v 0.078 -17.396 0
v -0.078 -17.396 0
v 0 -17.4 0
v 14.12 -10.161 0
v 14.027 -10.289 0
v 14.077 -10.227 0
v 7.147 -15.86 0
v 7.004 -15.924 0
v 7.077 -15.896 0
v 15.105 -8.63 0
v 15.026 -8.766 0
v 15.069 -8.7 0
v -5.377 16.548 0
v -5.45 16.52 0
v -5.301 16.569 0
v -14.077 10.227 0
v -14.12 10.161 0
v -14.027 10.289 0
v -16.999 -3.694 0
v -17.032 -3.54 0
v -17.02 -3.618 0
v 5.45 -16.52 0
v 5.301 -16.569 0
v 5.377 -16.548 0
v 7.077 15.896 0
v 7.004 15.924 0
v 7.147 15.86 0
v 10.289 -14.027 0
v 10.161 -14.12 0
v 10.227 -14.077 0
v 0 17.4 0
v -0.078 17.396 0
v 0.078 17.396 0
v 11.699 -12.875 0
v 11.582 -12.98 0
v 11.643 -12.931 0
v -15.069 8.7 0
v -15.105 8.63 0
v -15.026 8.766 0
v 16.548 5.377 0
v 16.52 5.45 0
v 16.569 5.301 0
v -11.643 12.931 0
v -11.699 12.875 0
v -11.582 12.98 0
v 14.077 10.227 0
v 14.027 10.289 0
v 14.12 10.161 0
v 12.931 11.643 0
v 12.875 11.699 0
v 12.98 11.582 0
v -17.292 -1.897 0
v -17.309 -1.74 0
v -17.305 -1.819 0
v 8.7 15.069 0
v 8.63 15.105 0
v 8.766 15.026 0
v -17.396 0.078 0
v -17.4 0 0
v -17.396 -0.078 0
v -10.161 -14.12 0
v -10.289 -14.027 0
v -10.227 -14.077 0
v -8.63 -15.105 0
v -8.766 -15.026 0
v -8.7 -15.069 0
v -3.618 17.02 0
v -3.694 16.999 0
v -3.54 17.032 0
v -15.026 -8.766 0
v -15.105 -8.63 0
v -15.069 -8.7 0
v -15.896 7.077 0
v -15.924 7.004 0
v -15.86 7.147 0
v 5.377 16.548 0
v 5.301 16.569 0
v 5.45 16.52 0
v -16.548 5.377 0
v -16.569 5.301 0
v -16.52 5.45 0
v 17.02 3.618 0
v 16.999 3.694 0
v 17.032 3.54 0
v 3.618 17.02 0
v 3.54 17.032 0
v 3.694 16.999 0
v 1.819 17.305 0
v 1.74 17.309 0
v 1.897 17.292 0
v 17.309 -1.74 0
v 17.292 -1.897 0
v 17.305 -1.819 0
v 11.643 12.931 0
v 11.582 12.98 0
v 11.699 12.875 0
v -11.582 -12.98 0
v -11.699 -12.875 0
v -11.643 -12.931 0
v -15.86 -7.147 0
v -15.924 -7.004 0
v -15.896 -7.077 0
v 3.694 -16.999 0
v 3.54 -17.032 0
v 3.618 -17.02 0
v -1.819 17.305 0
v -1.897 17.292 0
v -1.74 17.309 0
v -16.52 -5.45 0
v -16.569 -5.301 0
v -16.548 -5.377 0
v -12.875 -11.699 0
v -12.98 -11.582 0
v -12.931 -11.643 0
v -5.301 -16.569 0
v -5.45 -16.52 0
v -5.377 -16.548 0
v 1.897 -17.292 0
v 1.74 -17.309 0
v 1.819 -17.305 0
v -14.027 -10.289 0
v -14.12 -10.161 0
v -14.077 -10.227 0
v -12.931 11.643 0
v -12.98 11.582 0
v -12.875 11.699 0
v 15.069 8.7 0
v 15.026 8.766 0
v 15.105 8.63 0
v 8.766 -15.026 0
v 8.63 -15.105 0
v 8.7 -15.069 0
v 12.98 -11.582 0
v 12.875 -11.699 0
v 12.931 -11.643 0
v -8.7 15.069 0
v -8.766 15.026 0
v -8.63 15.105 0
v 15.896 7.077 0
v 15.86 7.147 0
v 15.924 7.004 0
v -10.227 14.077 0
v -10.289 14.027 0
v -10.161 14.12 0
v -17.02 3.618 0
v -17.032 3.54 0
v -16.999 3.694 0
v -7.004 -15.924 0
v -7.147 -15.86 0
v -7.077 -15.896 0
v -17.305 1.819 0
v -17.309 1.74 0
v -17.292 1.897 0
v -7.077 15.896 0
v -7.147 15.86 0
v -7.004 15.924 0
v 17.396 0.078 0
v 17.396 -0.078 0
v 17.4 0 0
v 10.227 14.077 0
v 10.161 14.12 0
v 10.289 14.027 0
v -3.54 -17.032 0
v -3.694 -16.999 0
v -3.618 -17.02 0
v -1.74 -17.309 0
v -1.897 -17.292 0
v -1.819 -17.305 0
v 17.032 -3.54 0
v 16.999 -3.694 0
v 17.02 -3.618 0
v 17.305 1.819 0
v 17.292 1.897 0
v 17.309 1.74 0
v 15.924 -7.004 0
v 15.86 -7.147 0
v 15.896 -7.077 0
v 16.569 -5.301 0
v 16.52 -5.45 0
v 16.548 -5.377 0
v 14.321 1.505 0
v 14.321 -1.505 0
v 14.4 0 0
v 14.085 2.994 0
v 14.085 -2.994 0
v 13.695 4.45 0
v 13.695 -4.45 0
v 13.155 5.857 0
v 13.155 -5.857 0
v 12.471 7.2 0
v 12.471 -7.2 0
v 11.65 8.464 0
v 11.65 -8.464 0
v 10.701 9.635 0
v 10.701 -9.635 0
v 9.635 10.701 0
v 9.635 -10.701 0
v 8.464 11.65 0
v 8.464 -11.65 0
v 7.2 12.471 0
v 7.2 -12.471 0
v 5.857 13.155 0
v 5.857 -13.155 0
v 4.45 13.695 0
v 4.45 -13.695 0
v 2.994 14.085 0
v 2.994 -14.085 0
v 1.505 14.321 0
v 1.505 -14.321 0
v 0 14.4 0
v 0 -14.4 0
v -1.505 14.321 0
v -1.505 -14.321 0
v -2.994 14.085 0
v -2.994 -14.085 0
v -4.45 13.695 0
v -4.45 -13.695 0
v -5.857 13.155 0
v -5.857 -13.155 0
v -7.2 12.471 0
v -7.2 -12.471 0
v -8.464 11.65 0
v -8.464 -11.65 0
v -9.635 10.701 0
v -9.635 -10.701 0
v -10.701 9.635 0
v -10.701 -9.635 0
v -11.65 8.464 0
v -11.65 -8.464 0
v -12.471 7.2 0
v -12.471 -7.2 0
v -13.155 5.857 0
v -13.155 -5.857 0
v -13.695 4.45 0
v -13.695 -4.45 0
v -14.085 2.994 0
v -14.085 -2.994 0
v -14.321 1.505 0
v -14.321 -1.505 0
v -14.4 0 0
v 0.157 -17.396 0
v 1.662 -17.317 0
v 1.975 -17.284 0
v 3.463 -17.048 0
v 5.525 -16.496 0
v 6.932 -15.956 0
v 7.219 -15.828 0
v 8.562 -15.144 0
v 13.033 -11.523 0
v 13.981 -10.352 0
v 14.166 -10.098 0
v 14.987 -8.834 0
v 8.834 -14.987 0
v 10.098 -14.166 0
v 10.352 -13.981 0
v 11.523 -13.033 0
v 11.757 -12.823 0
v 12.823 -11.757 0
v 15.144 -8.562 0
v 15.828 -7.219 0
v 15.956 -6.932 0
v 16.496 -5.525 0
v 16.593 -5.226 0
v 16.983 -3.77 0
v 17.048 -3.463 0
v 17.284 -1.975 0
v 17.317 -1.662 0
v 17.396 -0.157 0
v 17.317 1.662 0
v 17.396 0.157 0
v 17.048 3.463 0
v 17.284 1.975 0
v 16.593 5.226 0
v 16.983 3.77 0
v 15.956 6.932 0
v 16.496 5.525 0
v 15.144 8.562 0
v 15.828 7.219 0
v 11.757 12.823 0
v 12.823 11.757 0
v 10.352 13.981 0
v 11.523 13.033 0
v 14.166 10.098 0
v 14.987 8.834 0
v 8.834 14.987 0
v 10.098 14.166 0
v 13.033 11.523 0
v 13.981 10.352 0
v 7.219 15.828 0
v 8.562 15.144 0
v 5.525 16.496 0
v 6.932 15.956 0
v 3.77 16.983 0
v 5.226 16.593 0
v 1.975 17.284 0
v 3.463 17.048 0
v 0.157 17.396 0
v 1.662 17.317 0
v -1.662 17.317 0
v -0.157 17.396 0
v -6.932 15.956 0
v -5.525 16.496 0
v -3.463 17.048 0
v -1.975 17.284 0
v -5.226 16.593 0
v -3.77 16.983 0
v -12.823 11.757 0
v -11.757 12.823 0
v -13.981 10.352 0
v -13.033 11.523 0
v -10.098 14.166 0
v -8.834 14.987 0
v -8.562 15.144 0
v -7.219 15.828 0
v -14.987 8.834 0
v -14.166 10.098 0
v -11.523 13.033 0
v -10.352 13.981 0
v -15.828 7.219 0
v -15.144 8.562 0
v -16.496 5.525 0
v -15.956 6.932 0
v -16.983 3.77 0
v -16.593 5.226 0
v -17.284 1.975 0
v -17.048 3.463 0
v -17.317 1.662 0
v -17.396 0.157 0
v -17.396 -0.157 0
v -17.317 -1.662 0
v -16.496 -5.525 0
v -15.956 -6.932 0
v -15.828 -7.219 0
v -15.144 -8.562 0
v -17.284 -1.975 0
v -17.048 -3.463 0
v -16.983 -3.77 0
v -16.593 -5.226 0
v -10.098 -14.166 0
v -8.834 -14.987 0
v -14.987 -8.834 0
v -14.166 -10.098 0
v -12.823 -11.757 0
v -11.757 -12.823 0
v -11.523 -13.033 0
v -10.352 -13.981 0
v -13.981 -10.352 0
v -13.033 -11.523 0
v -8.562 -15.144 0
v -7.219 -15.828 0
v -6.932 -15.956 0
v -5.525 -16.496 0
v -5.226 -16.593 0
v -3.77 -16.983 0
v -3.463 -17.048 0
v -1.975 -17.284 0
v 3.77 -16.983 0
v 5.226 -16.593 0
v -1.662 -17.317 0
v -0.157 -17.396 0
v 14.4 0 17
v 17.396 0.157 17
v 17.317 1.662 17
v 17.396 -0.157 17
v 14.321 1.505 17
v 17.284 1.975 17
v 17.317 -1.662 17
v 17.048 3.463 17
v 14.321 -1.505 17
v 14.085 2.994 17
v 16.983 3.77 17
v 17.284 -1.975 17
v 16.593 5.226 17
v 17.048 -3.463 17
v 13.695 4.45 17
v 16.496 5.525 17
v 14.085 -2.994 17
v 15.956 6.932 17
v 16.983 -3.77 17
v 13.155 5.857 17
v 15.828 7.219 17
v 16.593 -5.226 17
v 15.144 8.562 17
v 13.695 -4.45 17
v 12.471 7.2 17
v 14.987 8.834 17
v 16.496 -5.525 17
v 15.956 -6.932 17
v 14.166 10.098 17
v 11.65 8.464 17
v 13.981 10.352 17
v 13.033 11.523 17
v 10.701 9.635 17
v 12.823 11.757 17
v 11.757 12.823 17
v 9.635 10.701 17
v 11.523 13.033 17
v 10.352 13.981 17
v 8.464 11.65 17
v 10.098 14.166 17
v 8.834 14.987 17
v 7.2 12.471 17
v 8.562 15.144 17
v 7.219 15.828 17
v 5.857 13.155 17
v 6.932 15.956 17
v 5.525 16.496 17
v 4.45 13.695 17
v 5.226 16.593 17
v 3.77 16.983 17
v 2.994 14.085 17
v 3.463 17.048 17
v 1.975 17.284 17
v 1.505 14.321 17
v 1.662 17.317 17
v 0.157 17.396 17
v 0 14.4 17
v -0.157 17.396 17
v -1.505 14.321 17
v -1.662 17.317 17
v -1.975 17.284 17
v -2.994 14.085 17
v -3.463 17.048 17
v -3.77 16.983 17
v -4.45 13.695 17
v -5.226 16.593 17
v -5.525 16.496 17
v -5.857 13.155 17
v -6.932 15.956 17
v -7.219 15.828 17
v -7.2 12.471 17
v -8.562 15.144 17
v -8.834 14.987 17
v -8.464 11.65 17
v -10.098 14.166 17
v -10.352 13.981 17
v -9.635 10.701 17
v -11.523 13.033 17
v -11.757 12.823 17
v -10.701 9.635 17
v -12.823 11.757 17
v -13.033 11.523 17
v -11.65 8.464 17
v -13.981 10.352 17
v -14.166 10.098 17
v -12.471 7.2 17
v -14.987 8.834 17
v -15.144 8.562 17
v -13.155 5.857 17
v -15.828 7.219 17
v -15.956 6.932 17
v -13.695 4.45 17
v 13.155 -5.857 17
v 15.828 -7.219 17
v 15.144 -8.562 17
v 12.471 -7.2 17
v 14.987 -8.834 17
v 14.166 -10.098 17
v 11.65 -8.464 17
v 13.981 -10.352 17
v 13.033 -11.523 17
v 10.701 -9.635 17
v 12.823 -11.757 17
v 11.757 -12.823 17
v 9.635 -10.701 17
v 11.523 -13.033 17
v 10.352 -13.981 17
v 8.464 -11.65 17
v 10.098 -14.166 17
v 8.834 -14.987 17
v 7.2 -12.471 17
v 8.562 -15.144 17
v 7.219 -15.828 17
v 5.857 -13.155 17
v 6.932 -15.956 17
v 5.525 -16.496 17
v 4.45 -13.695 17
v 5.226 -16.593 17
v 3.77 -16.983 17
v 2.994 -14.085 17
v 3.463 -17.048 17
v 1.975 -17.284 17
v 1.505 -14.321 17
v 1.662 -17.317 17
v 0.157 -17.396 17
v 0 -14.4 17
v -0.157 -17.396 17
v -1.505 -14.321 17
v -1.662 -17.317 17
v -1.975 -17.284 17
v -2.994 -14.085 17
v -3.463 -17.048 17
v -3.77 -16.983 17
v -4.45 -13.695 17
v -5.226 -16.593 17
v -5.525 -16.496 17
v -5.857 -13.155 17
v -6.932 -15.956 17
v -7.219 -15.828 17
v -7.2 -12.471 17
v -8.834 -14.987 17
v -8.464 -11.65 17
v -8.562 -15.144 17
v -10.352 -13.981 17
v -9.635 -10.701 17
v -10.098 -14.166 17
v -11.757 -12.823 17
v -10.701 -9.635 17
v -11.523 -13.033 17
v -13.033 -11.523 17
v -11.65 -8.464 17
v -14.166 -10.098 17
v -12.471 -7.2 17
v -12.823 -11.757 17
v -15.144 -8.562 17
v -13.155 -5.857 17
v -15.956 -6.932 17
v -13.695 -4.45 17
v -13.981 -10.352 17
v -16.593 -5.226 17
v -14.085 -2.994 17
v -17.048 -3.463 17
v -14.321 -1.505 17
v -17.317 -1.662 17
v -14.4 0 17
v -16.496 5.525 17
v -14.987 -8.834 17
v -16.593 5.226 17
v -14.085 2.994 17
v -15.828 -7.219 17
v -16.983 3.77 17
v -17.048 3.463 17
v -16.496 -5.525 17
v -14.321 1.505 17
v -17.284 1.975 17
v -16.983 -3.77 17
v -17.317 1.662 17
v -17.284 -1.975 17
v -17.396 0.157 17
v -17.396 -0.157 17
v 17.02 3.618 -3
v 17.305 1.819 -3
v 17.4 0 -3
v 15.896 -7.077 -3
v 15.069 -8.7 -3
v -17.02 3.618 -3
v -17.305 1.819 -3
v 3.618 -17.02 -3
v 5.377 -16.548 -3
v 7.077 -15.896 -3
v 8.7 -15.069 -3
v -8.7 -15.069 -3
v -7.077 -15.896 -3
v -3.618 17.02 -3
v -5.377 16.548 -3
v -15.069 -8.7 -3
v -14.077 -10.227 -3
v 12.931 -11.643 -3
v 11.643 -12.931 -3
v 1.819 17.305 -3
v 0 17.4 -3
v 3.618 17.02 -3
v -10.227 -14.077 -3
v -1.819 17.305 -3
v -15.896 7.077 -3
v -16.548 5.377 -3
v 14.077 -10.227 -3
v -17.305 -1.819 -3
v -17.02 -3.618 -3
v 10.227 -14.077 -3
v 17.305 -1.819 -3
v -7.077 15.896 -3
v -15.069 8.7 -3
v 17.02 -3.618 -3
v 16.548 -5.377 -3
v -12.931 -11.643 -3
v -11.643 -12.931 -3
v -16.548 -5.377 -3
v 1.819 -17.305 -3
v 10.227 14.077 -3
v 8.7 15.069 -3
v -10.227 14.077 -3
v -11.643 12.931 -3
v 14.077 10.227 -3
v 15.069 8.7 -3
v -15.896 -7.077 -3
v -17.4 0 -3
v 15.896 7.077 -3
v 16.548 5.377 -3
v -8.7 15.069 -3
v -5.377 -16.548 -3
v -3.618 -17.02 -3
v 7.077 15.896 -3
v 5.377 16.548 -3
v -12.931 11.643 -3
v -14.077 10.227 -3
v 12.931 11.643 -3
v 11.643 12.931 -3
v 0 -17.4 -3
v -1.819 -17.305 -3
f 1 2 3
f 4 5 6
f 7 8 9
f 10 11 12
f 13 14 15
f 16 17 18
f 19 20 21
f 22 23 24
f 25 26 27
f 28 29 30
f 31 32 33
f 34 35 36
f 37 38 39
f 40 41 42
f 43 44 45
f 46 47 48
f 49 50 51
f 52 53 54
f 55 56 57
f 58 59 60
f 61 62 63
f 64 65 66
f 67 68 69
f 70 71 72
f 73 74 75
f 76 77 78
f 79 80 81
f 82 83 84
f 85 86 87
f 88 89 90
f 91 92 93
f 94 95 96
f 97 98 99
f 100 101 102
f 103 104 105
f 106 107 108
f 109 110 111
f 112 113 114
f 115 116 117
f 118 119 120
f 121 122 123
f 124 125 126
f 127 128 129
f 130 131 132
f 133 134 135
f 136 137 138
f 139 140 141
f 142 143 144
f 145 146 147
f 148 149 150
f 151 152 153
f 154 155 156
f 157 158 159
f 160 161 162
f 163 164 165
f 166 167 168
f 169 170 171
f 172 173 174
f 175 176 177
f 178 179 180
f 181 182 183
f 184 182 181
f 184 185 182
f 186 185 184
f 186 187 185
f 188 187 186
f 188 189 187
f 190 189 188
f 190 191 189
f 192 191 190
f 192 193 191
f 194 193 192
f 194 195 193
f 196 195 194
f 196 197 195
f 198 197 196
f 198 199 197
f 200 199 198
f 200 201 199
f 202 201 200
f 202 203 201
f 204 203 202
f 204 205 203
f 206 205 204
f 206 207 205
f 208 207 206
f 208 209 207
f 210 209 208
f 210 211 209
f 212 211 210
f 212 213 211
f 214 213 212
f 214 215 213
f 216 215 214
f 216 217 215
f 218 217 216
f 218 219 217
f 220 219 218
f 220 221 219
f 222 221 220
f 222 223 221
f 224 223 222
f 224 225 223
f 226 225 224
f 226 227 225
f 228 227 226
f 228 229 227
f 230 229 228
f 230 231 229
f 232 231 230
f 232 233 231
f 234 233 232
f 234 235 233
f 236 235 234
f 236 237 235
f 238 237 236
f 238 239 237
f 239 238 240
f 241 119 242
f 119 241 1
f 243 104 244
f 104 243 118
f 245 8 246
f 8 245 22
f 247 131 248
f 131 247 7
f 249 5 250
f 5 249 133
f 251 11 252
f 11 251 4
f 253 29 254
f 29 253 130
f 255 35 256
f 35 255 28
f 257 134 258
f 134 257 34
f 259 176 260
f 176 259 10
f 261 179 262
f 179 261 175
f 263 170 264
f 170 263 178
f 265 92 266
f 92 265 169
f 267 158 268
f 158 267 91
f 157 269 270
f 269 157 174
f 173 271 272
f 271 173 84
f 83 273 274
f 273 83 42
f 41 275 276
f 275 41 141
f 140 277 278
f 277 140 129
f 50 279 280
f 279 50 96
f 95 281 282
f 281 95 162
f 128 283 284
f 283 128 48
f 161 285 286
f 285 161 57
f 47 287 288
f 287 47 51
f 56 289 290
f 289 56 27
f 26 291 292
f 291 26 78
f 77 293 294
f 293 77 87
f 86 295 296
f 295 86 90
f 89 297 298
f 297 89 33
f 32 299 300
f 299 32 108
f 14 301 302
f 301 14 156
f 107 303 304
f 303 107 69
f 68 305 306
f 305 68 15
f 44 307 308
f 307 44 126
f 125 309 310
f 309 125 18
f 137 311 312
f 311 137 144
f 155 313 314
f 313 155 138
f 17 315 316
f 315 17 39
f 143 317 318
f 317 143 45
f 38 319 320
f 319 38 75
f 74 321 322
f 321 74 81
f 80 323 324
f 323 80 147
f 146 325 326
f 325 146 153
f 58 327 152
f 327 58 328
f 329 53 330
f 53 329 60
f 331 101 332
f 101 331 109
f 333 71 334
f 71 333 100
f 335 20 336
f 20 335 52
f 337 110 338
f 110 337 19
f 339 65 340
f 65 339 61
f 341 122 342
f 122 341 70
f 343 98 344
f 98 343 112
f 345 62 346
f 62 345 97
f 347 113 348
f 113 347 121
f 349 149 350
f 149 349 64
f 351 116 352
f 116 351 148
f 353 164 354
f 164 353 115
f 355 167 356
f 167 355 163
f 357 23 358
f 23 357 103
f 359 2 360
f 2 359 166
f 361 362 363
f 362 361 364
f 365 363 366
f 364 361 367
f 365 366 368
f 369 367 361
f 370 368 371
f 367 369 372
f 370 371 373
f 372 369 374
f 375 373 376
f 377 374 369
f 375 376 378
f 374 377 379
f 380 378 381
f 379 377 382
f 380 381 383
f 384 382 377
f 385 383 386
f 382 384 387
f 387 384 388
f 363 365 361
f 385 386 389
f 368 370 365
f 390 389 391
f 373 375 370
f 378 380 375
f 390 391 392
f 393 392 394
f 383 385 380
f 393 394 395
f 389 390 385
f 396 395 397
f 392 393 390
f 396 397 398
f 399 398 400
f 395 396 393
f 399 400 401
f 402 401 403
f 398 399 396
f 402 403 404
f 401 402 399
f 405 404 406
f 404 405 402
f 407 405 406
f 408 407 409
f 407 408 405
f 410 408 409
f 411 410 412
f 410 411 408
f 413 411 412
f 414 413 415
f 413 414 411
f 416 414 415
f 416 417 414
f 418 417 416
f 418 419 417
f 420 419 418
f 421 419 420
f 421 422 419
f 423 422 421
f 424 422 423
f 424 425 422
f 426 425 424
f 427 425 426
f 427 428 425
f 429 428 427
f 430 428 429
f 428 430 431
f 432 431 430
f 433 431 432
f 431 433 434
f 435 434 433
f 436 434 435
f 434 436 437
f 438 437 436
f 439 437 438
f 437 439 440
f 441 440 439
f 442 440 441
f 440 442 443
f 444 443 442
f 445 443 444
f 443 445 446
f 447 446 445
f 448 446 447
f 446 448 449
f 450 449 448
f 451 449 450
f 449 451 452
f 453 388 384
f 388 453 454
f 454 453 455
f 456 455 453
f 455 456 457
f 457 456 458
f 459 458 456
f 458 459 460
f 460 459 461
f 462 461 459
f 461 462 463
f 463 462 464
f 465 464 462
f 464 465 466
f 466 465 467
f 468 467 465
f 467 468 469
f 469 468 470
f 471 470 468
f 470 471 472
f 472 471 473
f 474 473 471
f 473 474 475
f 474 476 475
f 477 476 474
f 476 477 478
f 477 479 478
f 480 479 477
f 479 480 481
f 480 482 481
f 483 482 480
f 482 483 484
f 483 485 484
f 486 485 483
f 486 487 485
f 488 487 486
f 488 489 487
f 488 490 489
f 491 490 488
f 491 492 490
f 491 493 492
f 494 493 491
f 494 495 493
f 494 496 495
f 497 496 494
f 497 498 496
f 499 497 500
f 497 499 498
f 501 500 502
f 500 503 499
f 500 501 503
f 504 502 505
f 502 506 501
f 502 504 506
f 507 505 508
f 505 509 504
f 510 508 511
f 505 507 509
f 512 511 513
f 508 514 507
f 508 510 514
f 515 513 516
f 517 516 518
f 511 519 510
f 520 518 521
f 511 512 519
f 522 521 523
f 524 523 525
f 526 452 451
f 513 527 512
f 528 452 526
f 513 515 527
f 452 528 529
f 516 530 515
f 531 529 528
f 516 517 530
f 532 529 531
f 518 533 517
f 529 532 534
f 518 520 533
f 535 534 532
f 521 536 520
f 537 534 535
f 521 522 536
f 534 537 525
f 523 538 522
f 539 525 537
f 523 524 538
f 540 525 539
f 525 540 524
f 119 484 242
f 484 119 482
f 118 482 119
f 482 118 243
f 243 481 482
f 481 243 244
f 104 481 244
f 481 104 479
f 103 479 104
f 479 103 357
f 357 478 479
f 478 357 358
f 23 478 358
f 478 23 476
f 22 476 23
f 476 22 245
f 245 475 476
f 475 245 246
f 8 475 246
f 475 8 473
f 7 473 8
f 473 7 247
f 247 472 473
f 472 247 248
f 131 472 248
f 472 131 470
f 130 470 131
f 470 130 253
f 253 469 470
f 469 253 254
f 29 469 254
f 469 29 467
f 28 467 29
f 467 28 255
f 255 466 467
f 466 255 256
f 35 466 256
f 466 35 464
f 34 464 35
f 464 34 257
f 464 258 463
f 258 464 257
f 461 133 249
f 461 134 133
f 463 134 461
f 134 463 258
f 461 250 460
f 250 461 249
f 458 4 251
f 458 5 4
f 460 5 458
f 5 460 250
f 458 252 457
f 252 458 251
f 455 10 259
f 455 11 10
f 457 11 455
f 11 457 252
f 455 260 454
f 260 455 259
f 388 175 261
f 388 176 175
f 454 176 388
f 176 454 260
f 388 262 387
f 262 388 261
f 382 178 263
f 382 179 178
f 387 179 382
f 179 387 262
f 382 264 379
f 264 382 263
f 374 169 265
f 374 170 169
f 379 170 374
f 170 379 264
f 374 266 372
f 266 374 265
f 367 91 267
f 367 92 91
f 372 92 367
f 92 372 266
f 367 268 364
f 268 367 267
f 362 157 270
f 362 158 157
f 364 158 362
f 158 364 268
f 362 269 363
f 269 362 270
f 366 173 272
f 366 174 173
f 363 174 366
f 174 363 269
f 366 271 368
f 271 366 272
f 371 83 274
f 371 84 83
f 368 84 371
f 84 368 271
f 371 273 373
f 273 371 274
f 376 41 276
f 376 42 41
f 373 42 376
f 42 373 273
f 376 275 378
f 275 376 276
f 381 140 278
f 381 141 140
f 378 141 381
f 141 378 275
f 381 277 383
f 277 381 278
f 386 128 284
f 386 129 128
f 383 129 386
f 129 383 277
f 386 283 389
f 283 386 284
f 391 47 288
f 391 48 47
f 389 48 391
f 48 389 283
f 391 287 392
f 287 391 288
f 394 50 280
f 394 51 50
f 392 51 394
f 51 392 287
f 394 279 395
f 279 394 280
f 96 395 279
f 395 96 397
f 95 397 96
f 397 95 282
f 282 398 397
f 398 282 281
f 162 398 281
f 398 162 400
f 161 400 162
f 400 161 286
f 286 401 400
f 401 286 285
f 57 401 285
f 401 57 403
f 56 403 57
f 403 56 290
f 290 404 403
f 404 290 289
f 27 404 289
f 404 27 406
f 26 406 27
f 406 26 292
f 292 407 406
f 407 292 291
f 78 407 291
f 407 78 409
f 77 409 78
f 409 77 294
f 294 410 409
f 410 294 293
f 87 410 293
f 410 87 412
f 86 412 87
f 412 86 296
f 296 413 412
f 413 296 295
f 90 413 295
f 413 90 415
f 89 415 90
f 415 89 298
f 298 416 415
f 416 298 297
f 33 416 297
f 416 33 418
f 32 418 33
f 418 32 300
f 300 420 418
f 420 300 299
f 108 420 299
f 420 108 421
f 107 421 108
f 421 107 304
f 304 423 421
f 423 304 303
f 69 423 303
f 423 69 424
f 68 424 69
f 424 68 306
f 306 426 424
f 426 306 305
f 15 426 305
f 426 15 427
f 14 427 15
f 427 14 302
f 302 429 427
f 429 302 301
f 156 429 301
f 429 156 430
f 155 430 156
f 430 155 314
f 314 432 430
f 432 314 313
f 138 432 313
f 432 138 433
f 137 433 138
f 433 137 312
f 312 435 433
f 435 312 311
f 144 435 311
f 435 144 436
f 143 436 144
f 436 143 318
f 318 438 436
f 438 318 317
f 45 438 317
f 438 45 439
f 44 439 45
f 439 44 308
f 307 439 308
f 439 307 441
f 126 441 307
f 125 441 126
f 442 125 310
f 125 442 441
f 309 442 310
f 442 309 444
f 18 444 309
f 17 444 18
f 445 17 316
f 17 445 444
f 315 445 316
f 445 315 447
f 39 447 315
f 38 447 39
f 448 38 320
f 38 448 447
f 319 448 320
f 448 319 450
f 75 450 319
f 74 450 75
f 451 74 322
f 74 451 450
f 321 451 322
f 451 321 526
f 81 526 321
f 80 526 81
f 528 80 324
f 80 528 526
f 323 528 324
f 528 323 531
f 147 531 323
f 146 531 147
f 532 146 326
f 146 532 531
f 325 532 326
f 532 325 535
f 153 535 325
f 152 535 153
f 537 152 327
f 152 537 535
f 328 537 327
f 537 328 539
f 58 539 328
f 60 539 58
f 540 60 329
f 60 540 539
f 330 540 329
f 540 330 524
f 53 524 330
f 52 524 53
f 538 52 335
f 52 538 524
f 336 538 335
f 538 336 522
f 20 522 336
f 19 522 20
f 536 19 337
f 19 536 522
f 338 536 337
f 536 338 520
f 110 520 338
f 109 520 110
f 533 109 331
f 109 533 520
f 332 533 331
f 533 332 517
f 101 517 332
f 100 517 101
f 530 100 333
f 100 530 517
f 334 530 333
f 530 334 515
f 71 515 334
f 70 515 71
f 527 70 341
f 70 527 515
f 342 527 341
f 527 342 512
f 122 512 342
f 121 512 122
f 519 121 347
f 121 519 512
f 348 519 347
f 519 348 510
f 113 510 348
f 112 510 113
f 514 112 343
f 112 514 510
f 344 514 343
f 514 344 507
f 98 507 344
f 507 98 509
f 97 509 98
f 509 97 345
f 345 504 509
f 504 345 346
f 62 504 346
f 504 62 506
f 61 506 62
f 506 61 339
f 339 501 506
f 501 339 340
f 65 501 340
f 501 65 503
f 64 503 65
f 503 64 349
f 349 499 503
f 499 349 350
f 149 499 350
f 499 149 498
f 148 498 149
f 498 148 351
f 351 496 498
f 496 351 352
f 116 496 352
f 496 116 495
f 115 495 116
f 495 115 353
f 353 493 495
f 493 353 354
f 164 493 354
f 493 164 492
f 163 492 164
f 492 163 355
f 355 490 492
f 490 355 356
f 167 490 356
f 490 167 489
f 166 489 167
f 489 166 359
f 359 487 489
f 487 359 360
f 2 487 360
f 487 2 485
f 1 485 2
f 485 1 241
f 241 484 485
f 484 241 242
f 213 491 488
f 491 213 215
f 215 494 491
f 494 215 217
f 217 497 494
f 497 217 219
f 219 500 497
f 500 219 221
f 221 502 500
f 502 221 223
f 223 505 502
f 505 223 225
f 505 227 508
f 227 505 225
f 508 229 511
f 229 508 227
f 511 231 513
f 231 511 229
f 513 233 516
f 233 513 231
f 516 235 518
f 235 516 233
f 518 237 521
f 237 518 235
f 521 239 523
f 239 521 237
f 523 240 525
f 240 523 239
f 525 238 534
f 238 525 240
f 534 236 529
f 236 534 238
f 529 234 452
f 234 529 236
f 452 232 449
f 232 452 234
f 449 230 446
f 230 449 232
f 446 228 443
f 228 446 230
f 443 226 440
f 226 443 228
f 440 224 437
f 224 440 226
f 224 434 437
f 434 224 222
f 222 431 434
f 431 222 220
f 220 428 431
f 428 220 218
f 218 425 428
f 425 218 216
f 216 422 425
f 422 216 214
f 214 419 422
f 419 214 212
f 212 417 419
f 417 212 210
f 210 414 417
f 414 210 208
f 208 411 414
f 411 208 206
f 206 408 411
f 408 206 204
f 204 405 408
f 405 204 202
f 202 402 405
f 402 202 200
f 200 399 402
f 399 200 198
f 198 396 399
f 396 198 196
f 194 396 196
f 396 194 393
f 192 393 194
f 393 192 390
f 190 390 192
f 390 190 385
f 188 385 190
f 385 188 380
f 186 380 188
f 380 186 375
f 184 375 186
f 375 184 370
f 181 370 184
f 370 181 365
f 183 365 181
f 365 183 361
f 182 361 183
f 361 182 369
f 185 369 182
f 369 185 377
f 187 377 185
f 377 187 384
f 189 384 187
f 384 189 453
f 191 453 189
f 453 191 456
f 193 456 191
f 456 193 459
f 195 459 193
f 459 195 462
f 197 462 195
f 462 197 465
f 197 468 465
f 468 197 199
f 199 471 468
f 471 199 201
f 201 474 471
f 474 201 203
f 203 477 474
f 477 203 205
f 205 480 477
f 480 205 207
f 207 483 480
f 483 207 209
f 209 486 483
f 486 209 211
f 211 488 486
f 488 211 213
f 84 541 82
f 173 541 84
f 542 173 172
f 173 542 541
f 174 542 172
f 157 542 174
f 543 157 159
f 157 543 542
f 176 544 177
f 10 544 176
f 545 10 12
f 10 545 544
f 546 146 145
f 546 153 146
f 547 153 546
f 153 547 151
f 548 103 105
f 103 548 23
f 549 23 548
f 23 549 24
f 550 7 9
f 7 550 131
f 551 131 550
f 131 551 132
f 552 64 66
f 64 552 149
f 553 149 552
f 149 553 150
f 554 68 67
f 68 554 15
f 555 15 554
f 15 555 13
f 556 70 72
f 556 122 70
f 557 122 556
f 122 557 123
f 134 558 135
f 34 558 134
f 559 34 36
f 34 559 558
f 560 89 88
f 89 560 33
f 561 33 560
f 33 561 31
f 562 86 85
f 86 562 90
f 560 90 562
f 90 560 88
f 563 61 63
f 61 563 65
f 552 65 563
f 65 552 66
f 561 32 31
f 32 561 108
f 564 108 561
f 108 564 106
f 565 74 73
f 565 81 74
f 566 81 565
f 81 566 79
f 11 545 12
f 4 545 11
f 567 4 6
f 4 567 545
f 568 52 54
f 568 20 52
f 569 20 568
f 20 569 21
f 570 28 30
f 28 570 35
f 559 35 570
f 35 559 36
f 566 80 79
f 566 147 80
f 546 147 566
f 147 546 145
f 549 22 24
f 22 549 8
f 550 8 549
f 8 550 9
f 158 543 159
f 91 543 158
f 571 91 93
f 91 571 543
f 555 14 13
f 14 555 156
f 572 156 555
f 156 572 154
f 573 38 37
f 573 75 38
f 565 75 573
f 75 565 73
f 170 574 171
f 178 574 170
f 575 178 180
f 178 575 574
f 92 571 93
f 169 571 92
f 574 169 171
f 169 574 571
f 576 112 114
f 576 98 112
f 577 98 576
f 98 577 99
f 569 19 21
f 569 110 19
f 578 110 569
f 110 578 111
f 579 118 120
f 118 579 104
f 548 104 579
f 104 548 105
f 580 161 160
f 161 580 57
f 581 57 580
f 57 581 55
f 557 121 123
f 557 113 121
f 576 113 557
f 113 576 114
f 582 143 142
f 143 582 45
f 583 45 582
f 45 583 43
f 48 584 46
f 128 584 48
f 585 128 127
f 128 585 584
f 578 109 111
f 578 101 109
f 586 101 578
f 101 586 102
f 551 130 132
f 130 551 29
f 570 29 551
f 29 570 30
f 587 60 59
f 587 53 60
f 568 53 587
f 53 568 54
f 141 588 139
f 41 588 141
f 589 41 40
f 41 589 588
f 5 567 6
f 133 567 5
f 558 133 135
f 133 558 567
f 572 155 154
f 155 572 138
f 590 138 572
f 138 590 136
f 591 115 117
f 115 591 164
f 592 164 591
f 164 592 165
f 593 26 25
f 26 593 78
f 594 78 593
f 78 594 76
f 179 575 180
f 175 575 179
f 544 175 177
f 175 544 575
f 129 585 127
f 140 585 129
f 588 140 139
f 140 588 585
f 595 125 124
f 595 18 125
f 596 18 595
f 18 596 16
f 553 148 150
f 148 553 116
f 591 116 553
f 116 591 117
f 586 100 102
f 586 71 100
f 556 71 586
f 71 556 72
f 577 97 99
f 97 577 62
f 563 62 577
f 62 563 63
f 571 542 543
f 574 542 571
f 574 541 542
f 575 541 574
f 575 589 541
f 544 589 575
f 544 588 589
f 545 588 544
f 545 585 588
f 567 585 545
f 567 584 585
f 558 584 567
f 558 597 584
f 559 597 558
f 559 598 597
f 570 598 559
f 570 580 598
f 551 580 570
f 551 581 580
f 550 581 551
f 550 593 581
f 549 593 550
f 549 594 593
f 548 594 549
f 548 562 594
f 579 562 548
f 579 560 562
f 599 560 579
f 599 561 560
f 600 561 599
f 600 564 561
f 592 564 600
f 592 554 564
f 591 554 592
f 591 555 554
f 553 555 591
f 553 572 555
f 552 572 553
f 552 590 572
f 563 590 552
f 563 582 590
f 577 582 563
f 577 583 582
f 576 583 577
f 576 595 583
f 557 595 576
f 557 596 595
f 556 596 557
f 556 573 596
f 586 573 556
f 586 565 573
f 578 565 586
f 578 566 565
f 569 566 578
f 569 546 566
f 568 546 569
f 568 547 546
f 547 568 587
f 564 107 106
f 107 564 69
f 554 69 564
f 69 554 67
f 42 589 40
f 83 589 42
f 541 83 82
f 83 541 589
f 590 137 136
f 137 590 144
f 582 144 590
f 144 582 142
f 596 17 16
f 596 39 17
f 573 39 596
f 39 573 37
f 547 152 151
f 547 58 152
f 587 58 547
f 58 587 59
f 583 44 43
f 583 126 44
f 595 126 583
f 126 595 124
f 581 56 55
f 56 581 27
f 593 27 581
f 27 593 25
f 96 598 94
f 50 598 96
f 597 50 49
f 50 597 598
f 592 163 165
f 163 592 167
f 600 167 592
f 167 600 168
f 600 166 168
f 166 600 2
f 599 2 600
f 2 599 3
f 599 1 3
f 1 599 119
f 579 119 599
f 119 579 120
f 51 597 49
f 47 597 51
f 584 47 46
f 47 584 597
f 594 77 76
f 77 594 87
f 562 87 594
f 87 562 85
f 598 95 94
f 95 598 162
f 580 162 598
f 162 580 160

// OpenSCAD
$fn = 60;
diameter = 28.8;
height = 17;
thickness = 3;

union()
{
    linear_extrude(height = height) difference()
    {
        offset(thickness) circle(diameter / 2);
        circle(diameter / 2);
    }
    translate([ 0, 0, -thickness ]) linear_extrude(thickness) circle((diameter / 2) + thickness);
}
